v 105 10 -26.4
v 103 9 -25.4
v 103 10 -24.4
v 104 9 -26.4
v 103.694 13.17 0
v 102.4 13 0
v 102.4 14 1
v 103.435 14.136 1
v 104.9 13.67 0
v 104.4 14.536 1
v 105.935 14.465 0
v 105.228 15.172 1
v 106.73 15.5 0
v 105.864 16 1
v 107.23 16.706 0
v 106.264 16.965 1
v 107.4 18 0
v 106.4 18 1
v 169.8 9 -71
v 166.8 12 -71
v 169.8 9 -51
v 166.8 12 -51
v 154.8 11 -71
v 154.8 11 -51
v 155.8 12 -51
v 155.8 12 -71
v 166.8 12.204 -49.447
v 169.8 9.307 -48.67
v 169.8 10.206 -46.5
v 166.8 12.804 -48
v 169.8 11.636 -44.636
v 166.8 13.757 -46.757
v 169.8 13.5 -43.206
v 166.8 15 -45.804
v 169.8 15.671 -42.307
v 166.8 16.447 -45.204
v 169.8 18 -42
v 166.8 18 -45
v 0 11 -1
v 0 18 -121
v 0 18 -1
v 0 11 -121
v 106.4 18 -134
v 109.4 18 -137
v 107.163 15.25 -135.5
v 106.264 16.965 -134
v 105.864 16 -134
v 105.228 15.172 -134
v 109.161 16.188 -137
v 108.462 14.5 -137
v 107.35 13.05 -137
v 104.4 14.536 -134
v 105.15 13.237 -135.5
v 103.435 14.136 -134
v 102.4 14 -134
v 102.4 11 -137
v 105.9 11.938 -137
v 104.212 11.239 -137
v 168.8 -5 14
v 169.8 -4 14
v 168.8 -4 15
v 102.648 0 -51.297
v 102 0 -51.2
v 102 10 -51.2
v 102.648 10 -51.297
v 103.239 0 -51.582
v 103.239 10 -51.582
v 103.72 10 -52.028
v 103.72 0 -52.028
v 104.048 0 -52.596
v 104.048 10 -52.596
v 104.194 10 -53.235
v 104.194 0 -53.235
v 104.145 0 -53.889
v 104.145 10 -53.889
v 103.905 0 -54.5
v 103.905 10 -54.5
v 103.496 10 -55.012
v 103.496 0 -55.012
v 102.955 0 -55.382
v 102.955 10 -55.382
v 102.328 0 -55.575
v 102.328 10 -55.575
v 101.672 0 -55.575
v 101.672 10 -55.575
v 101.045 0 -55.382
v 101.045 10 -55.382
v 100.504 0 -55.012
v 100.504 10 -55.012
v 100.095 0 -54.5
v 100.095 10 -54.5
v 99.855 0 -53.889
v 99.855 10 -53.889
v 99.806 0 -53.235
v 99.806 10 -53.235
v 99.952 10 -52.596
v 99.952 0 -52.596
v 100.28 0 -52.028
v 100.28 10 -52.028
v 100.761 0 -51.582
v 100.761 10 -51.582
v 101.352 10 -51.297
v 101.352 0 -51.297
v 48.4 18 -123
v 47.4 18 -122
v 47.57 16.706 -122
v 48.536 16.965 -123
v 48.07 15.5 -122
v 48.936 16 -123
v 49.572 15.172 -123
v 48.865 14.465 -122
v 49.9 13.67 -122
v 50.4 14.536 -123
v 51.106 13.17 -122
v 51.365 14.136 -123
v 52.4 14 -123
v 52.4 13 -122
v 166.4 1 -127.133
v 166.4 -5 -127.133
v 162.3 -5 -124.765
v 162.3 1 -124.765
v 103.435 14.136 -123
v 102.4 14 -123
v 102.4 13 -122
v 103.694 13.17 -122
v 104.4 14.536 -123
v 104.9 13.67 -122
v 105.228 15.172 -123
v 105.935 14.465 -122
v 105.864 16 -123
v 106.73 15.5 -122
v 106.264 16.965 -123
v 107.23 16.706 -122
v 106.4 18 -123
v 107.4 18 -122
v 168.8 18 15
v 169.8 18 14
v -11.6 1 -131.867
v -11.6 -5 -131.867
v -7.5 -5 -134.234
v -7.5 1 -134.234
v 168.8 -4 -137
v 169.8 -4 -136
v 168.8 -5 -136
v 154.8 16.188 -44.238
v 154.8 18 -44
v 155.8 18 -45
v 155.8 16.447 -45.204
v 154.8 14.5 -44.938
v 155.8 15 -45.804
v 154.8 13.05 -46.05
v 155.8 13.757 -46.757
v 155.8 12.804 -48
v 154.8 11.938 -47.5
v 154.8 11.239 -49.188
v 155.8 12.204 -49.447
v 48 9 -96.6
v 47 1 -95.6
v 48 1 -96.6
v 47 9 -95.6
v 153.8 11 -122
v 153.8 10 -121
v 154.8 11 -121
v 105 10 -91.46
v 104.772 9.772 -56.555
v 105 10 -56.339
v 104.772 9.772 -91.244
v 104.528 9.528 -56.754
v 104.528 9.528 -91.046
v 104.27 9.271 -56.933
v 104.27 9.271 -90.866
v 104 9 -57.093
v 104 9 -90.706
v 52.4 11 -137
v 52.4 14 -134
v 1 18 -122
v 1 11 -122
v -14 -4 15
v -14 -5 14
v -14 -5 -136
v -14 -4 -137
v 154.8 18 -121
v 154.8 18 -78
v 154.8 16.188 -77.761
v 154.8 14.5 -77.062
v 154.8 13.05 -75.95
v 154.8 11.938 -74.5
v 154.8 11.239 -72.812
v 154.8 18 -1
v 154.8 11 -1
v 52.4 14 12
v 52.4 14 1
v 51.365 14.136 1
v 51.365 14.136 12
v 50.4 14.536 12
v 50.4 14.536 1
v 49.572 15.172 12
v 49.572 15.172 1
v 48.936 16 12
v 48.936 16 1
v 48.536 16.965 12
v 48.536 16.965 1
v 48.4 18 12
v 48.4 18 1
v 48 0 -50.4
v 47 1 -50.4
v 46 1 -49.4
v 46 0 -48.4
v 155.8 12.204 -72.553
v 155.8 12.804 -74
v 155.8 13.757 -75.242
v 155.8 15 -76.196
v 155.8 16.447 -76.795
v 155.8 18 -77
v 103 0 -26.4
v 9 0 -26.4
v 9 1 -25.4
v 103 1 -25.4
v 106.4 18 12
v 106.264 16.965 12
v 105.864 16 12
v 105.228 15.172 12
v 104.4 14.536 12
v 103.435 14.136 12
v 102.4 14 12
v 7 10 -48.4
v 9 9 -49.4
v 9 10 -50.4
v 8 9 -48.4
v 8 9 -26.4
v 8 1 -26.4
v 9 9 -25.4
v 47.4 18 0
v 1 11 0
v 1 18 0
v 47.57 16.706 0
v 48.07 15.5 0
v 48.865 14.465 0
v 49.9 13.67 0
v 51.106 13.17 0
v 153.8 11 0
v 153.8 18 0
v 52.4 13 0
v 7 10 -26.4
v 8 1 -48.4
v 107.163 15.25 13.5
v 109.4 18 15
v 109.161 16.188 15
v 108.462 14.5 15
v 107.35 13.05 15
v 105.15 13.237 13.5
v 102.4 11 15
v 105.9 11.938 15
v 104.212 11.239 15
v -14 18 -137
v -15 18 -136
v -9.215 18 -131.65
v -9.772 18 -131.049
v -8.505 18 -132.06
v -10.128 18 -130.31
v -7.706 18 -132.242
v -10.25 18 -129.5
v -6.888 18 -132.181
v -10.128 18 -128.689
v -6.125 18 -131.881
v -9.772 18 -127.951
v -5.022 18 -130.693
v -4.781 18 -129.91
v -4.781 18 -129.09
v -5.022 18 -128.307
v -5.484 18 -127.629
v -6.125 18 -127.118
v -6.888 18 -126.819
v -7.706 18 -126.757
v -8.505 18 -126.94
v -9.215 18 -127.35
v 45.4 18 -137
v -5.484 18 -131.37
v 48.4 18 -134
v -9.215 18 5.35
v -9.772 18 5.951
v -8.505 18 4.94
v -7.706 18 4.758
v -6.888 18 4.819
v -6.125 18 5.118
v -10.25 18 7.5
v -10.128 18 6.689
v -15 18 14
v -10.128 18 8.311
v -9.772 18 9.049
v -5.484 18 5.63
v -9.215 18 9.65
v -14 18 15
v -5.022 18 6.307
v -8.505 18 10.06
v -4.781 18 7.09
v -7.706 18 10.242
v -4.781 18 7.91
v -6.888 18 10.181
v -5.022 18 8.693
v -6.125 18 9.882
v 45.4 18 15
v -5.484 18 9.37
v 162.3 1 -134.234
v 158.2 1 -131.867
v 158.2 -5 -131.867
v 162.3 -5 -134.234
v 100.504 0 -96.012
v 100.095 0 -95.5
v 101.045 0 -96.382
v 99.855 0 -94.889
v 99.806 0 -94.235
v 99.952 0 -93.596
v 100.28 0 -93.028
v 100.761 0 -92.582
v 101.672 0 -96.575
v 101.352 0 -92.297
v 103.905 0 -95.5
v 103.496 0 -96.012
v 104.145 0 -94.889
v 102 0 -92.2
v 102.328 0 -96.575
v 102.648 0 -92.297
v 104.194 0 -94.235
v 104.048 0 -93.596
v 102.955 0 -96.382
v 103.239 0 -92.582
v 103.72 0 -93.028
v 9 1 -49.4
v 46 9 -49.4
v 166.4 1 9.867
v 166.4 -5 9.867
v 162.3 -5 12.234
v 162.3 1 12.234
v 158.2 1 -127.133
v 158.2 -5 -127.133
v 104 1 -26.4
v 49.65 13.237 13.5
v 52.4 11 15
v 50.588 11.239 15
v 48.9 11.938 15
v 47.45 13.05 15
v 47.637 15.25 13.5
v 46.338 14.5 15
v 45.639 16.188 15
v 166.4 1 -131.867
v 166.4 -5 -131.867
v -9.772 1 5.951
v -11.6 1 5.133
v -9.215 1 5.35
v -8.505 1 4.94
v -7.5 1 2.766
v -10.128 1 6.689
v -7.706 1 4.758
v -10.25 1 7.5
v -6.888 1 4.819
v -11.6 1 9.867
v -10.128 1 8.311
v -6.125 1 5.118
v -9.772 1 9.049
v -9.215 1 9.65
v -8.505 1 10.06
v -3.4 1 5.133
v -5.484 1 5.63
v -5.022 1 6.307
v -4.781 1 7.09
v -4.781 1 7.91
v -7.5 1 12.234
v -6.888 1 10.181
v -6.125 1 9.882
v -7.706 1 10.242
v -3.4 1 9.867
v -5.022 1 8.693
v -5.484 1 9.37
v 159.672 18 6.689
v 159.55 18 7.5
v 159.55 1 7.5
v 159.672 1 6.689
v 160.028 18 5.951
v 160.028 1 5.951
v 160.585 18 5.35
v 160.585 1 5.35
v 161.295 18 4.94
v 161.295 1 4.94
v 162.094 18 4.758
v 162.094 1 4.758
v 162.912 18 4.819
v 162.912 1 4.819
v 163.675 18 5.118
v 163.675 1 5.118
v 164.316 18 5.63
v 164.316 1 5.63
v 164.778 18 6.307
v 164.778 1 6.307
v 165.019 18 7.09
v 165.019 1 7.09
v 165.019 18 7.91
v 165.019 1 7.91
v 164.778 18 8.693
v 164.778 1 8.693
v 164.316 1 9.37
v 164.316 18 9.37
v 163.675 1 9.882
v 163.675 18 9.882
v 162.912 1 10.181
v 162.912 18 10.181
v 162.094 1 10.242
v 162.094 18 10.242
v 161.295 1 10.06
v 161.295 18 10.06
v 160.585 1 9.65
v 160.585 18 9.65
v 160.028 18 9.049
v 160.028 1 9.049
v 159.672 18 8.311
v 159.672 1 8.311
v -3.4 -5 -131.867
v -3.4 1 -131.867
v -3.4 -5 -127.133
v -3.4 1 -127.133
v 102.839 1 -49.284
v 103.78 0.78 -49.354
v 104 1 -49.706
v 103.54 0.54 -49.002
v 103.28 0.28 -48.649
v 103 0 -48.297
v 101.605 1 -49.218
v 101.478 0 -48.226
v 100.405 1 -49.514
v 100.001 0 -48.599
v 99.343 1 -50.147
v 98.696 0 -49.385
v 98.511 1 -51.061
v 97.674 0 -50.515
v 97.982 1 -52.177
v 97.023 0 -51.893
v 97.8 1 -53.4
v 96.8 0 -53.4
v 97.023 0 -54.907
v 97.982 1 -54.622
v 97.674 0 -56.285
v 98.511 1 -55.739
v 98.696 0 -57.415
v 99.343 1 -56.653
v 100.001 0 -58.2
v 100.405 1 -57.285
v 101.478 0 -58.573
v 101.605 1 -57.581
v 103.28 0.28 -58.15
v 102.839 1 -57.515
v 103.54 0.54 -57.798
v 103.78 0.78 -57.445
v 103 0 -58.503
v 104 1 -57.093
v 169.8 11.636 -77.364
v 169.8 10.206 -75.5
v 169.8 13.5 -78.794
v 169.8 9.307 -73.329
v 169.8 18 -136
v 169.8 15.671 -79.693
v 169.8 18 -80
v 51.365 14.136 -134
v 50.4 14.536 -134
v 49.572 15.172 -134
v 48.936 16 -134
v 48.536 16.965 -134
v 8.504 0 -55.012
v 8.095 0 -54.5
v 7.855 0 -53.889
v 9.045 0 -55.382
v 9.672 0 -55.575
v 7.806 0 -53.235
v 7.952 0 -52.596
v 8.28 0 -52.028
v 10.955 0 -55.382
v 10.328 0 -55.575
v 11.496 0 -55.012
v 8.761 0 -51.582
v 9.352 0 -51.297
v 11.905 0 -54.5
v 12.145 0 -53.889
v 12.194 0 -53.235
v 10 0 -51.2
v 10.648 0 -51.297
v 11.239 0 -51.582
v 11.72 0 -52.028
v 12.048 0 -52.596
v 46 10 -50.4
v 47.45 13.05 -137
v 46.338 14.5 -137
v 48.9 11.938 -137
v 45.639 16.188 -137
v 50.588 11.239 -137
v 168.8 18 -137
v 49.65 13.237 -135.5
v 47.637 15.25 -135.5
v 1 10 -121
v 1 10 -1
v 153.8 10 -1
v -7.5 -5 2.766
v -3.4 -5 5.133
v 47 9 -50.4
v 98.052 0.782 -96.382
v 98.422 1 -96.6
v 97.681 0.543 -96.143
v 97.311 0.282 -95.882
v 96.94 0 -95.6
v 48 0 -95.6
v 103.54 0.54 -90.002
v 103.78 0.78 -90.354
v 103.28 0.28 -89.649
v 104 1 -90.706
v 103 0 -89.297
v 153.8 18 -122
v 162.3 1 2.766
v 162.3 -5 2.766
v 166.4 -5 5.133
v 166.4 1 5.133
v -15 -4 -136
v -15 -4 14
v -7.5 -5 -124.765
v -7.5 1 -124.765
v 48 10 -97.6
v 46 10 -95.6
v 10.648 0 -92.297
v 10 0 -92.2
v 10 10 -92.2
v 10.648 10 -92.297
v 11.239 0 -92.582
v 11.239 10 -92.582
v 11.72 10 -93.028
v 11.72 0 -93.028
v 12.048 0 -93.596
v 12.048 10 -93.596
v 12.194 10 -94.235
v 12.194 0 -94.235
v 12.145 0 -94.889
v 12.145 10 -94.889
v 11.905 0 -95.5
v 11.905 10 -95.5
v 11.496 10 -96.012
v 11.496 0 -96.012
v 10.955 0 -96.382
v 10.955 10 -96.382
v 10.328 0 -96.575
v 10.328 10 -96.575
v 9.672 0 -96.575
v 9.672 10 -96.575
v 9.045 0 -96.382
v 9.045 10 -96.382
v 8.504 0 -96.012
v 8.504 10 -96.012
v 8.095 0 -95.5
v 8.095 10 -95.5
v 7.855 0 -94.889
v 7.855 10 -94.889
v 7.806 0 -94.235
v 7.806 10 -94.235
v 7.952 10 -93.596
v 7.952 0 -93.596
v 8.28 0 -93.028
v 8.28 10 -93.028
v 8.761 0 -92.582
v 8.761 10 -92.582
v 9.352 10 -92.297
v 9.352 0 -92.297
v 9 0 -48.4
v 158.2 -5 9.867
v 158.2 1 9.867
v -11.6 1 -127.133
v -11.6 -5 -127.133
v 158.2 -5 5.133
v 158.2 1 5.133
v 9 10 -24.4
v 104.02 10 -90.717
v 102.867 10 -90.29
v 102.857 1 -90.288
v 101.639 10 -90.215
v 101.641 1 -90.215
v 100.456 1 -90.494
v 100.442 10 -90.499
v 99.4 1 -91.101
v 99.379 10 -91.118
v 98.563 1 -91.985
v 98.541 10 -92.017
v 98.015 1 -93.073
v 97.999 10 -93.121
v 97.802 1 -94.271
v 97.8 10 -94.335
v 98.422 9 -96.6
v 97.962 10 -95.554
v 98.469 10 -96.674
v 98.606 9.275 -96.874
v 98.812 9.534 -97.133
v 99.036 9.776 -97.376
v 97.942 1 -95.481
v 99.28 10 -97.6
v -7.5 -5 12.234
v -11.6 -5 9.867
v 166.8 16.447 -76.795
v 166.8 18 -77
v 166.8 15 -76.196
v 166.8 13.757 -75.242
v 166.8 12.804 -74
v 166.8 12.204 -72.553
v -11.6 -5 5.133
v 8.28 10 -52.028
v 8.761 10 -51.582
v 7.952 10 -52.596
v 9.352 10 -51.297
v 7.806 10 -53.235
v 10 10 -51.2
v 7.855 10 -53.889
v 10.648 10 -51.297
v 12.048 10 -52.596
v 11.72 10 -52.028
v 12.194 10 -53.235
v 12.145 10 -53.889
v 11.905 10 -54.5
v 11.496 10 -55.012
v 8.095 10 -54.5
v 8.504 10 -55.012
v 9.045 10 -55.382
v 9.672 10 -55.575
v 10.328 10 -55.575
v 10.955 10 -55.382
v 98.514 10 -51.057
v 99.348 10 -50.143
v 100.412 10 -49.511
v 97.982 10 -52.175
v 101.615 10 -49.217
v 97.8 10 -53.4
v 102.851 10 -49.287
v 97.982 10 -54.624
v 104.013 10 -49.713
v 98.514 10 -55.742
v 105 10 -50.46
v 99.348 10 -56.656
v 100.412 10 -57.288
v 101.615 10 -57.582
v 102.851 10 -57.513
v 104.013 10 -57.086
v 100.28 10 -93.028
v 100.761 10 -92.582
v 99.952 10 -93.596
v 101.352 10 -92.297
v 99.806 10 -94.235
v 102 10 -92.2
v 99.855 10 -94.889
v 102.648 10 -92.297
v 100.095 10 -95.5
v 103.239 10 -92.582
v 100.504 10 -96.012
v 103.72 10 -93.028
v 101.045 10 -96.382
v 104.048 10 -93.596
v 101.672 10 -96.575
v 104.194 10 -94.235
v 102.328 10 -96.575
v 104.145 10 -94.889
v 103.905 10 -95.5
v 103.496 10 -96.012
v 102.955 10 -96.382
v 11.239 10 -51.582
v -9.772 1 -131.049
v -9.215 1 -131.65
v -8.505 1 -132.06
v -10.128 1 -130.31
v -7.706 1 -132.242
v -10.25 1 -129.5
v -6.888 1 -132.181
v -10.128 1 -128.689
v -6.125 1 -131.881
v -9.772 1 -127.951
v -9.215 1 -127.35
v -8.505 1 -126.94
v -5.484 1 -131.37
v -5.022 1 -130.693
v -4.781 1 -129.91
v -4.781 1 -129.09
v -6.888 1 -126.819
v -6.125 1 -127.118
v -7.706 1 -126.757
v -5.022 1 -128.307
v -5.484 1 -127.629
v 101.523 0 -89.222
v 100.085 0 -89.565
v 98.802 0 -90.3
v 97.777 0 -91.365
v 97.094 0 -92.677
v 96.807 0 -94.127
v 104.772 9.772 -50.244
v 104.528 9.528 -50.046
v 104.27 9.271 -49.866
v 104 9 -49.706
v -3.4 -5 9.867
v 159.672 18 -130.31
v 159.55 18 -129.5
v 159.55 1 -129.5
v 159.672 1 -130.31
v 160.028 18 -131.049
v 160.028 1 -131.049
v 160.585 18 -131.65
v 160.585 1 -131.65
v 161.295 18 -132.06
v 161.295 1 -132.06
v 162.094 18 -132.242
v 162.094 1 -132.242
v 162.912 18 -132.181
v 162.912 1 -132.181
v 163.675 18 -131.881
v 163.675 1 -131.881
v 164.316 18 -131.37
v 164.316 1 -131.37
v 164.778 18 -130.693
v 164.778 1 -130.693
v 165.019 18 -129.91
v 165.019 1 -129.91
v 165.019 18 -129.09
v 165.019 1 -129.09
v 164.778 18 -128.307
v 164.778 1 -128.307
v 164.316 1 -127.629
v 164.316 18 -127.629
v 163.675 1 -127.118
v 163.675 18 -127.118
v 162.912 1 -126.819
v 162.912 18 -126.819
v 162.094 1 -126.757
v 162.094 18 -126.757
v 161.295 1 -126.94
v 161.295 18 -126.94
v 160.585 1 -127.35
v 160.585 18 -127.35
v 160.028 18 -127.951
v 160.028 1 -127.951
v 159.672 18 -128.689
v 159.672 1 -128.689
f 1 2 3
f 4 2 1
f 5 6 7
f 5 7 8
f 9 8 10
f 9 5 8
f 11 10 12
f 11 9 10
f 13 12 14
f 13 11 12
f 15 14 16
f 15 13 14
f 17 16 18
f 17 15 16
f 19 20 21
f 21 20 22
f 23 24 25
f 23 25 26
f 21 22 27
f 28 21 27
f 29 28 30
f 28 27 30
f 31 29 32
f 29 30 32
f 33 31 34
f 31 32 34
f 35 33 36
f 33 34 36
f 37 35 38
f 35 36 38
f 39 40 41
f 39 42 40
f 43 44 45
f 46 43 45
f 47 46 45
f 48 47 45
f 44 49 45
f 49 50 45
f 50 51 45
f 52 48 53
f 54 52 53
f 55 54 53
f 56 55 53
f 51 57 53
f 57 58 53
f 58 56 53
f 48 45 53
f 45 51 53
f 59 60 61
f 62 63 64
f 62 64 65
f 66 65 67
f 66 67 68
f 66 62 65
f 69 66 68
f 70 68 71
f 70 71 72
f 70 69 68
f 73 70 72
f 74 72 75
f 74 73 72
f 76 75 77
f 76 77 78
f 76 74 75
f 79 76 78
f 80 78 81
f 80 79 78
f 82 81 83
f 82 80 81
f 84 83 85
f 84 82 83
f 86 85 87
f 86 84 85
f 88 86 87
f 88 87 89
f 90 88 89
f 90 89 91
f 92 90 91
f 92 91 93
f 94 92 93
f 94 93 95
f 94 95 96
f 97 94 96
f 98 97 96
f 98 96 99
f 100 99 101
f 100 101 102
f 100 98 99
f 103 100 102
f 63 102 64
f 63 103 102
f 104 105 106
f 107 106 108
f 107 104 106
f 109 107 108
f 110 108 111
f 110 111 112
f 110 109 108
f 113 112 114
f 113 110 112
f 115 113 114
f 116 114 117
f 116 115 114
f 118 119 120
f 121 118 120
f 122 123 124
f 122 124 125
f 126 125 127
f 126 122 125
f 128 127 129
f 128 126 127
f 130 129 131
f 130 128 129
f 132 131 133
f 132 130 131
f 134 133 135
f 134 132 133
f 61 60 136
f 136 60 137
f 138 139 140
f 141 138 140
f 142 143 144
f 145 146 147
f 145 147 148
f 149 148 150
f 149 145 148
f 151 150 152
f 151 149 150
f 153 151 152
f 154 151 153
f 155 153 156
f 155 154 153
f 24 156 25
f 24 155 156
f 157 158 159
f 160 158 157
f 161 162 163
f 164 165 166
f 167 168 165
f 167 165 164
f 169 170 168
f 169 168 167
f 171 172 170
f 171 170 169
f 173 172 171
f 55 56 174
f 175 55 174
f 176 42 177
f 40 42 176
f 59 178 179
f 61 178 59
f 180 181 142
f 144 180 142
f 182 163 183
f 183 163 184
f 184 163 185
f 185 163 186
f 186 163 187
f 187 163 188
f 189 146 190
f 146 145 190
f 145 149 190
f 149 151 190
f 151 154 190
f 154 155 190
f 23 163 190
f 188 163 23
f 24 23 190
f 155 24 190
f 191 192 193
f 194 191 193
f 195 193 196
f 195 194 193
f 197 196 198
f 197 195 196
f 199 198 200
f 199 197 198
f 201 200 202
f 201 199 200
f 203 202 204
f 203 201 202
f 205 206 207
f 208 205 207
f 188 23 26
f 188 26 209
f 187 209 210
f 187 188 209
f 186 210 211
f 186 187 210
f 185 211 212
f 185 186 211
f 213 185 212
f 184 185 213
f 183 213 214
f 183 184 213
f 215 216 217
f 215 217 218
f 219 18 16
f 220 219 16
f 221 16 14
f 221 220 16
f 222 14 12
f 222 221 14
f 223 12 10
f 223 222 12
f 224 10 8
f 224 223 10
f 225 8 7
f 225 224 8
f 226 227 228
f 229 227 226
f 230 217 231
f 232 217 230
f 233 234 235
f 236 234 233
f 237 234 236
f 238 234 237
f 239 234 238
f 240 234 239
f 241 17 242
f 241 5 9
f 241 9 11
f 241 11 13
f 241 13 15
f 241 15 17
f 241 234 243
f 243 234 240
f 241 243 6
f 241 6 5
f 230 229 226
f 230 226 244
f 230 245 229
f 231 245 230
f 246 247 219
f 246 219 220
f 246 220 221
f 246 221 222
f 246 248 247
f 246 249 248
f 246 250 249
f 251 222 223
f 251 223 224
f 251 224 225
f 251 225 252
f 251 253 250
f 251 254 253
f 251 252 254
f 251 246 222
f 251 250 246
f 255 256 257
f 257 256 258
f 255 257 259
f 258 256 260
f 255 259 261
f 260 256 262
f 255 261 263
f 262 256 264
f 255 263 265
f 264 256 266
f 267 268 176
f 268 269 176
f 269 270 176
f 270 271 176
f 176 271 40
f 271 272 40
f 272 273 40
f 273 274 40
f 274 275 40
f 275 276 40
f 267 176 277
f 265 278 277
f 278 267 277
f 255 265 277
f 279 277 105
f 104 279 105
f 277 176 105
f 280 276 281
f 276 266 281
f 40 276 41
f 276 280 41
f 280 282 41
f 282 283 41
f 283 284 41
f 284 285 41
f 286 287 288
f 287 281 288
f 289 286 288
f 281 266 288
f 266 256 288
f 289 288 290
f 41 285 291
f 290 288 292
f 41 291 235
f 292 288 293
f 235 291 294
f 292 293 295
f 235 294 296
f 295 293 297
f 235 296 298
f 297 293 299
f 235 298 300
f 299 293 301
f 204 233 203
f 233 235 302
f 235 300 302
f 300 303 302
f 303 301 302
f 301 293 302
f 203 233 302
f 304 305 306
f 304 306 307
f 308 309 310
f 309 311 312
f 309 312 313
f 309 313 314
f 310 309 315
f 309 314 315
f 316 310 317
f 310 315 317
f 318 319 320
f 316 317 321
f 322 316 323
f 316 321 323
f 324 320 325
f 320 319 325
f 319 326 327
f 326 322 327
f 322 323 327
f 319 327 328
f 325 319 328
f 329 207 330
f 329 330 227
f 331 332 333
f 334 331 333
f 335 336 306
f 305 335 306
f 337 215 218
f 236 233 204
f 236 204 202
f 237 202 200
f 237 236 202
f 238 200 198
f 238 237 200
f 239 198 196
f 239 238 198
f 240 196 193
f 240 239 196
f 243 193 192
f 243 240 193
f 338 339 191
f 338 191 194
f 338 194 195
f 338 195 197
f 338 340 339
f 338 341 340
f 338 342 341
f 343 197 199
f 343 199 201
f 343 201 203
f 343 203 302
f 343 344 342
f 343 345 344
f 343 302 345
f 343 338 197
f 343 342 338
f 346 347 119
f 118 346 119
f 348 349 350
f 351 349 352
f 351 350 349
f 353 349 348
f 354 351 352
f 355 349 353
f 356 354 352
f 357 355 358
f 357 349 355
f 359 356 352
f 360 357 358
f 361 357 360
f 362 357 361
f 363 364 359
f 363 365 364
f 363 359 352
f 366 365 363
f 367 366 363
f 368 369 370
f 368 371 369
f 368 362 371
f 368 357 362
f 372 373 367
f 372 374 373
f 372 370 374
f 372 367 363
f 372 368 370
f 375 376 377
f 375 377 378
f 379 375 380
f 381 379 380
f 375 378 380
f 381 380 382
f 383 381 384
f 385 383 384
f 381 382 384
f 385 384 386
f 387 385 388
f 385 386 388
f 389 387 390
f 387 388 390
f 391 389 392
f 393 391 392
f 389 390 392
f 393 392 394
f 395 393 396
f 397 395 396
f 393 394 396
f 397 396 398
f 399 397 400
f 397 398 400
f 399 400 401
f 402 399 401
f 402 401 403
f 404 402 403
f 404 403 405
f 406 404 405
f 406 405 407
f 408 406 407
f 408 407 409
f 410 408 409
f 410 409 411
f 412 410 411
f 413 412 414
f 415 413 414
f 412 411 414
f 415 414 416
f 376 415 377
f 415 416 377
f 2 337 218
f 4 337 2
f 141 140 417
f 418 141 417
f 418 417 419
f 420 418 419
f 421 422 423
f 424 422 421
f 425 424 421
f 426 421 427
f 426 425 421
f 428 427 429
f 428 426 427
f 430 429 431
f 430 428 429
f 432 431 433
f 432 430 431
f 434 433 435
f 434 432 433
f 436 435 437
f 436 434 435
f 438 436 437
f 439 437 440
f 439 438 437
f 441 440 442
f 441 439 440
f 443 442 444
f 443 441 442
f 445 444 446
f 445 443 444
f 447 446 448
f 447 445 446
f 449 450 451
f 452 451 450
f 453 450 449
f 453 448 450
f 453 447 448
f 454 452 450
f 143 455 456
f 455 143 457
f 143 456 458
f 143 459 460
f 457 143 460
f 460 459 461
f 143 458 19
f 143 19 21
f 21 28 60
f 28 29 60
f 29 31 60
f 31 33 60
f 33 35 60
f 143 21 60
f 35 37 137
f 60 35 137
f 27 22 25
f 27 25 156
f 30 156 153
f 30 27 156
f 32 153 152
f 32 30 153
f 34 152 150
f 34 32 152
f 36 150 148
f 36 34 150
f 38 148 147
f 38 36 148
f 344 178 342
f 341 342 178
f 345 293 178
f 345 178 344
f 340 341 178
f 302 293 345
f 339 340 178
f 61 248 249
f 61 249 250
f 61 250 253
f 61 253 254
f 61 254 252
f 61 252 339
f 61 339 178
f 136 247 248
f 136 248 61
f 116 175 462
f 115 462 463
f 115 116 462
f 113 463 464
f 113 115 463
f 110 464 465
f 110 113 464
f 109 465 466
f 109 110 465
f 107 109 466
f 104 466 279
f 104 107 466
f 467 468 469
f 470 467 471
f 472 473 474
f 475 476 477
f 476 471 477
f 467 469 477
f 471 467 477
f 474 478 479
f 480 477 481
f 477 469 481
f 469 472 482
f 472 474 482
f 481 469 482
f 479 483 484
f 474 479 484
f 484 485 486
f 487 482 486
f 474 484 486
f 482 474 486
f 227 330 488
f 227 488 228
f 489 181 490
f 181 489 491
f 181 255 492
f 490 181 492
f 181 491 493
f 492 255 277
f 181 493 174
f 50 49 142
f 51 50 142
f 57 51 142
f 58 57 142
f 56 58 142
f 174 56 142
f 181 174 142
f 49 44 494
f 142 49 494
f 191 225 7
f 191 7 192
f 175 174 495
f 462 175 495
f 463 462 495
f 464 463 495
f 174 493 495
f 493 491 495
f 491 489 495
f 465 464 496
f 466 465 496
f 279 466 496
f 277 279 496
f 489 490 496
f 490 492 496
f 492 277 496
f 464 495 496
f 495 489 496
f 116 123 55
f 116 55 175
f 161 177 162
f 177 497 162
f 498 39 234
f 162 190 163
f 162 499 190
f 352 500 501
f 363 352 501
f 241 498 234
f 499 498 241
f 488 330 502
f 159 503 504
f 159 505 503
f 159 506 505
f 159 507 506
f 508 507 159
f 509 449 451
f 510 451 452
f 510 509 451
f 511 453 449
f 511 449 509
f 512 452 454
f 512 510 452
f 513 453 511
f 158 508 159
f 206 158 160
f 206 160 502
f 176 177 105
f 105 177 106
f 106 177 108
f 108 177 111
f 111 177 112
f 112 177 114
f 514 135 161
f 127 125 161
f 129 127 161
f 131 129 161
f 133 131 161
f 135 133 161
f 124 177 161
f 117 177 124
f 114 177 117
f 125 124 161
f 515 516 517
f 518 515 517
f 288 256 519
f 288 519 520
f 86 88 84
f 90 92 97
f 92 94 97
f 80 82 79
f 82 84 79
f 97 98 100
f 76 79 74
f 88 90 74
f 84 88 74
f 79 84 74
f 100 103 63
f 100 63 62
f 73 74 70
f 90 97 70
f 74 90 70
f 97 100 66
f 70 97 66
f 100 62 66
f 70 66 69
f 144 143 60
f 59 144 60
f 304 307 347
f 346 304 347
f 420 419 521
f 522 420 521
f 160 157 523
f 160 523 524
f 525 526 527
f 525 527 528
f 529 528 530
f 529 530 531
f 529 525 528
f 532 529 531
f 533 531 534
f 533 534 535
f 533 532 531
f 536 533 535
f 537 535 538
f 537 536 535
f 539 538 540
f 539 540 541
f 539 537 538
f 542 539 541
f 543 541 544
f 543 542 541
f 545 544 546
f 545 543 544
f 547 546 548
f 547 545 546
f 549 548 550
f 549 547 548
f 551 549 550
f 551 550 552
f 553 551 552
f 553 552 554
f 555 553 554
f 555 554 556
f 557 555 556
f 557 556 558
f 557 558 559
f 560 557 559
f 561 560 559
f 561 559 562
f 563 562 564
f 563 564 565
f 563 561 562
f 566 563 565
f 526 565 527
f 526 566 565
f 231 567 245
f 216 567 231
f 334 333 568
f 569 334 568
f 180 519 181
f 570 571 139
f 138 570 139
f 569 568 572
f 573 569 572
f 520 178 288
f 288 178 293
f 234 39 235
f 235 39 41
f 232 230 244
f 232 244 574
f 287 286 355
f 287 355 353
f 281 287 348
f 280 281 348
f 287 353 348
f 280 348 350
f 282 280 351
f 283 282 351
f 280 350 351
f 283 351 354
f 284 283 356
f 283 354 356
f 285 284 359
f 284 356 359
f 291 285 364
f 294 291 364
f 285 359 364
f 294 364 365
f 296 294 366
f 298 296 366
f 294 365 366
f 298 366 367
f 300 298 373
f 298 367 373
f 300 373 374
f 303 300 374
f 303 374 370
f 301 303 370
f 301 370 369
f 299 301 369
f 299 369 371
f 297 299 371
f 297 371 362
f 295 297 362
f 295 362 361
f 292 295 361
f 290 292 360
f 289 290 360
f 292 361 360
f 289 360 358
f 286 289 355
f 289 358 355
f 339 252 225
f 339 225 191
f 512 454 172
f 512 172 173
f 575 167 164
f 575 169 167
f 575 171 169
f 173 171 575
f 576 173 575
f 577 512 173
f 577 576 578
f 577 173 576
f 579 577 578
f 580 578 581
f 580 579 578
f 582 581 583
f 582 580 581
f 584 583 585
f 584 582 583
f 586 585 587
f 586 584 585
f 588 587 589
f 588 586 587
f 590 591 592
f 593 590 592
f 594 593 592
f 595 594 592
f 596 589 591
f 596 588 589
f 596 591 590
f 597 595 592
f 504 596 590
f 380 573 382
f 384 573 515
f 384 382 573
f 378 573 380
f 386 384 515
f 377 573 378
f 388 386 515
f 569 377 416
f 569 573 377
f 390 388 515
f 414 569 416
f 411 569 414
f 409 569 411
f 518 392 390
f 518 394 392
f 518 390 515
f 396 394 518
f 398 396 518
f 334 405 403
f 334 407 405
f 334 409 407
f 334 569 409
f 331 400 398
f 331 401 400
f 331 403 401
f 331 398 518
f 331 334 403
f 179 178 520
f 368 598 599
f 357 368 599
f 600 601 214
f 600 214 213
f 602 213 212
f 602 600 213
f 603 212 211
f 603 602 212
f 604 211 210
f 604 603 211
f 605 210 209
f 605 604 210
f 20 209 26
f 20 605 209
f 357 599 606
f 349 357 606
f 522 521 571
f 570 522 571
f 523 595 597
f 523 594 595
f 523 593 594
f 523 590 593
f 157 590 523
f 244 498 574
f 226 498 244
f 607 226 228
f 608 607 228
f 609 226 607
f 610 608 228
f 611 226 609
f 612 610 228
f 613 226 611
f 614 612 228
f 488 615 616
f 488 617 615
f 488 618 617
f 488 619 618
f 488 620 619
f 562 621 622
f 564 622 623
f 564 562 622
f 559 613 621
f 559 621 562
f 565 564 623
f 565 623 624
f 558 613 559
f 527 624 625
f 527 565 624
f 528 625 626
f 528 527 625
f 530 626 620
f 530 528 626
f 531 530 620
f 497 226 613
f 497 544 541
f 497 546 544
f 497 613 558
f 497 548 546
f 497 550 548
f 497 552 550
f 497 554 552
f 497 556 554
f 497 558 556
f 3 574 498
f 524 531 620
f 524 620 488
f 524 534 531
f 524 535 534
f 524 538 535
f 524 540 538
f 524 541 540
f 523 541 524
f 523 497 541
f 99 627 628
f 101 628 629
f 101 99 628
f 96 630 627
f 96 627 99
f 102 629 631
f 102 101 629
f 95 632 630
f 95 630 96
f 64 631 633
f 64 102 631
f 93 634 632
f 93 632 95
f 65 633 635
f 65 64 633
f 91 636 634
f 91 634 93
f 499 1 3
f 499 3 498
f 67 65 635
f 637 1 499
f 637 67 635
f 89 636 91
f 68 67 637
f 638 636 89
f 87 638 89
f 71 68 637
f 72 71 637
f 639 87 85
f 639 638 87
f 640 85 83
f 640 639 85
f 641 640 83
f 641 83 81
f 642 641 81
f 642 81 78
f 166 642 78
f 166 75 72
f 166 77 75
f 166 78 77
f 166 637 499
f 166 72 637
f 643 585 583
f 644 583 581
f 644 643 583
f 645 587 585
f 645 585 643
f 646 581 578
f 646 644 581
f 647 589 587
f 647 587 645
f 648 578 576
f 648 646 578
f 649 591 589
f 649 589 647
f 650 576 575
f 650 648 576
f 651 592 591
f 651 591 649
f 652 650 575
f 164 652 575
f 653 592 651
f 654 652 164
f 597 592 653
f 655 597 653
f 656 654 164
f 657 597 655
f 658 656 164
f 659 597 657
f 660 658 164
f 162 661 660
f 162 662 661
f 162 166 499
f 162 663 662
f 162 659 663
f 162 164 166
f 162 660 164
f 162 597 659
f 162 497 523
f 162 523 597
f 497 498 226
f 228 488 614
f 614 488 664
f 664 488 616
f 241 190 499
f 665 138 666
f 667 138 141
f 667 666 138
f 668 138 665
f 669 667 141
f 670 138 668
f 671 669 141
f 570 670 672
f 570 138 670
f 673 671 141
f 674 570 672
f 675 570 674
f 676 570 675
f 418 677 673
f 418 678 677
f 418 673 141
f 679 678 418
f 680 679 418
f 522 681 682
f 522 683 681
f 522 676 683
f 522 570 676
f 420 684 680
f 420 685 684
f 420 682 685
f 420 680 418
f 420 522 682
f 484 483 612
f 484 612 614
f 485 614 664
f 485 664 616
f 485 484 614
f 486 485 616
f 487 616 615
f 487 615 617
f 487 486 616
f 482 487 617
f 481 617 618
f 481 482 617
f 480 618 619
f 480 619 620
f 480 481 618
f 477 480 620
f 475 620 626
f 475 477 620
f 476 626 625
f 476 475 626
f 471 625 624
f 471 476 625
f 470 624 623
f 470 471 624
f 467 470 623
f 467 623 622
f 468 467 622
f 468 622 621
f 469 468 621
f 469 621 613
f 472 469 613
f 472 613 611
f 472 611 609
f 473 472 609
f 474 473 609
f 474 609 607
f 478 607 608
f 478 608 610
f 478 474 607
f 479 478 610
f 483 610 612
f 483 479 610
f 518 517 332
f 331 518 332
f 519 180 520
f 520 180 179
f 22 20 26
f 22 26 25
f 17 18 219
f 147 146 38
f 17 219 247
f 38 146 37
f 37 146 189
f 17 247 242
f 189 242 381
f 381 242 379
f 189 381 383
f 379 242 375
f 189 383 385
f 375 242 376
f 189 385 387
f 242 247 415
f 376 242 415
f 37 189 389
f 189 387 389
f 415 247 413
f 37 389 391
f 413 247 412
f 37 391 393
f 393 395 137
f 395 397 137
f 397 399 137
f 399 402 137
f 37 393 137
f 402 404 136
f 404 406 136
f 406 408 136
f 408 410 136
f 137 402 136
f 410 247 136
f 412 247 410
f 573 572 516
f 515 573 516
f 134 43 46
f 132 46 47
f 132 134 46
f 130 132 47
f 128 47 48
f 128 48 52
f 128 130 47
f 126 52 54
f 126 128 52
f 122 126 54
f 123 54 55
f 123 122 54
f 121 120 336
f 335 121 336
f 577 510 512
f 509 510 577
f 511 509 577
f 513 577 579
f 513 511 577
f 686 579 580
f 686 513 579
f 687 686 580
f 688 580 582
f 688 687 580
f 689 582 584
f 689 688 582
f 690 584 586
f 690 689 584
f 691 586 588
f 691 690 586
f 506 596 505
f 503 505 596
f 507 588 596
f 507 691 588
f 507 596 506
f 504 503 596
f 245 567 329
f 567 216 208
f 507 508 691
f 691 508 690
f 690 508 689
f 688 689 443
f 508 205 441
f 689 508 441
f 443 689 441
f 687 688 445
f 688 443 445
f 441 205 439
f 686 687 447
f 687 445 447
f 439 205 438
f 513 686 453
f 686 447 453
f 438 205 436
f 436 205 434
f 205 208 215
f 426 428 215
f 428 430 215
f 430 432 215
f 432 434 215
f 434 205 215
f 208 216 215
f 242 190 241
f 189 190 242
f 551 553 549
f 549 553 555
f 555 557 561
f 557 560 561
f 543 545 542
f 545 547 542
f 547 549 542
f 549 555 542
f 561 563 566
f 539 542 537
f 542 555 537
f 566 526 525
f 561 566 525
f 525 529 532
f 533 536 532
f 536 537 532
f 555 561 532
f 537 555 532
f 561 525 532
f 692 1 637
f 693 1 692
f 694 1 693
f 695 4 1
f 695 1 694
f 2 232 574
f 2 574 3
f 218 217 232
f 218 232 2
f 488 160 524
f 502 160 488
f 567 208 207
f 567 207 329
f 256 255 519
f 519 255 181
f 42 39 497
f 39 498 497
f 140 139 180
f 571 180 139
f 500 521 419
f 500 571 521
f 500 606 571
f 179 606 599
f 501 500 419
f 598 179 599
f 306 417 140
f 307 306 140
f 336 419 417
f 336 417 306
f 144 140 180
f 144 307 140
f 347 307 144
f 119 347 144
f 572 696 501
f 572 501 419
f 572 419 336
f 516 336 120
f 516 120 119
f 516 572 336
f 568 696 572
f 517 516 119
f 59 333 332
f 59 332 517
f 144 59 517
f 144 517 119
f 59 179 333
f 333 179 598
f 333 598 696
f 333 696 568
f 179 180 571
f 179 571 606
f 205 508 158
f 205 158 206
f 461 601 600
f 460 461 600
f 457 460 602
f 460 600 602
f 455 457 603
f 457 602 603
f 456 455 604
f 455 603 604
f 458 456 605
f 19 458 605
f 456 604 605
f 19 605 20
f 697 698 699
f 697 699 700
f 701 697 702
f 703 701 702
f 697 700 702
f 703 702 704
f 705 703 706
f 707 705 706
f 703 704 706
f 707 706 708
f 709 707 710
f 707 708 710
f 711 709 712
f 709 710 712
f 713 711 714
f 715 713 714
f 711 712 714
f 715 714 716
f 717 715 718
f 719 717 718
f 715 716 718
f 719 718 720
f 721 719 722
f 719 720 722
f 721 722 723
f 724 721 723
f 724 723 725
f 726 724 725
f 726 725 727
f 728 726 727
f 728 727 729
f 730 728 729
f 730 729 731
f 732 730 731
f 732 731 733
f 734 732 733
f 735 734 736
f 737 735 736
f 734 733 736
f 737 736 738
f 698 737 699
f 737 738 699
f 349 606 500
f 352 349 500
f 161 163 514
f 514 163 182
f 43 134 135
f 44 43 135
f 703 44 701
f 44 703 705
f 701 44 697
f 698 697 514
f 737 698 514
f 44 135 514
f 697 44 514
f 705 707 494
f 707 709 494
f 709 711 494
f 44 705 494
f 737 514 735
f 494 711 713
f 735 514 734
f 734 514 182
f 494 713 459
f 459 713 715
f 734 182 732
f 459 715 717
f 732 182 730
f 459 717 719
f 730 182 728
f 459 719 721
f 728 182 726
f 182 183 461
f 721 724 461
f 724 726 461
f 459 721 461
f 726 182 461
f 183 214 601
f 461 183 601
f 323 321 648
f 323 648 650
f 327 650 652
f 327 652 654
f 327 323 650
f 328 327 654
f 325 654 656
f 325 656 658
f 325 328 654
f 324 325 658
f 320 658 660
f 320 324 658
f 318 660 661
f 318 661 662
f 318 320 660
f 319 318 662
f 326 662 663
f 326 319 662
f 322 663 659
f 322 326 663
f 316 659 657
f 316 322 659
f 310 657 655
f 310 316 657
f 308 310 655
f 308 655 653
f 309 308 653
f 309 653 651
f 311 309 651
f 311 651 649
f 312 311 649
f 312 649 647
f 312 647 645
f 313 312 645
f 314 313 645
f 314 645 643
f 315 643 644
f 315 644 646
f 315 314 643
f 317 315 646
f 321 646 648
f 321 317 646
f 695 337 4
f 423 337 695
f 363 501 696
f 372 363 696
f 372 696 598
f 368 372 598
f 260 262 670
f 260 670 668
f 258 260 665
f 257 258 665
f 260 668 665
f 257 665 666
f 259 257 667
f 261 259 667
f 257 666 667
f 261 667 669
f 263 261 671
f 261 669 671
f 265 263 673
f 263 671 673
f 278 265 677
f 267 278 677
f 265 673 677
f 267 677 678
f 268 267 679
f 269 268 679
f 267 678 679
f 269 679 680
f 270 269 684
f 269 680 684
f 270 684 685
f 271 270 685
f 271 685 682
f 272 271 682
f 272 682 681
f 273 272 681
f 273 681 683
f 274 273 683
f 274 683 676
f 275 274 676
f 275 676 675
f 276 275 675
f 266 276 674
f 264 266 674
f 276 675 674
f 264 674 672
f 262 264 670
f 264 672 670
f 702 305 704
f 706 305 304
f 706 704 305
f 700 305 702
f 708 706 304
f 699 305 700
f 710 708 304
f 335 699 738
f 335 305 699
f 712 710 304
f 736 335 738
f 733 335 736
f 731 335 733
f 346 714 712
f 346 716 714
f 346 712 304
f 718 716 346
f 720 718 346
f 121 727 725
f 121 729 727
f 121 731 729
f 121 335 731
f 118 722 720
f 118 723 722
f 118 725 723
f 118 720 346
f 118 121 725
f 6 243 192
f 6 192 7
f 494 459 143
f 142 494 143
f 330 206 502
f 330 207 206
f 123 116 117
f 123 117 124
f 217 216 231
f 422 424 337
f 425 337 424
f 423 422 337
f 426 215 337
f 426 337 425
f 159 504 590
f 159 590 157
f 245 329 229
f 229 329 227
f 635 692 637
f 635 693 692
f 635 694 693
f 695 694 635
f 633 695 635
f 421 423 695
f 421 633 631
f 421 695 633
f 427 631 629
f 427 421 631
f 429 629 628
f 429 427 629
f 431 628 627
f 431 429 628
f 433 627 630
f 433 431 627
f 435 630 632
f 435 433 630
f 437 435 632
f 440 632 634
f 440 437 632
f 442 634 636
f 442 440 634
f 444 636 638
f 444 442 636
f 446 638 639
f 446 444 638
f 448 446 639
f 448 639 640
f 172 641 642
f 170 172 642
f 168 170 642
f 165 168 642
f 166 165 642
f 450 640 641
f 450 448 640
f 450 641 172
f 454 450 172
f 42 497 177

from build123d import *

# Parameters (mm, degrees)
SKETCH1_W                = 154.8
SKETCH1_H                = 121.9997
SKETCH1_R                = 2.2
BOSS_EXTRUDE1_DEPTH      = 10
SKETCH2_W                = 184.8
SKETCH2_H                = 151.9997
SKETCH2_W_2              = 154.8
SKETCH2_H_2              = 121.9997
BOSS_EXTRUDE2_DEPTH      = 18
SKETCH2_2_W              = 184.8
SKETCH2_2_H              = 151.9997
SKETCH2_2_W_2            = 154.8
SKETCH2_2_H_2            = 121.9997
BOSS_EXTRUDE3_DEPTH      = 5
CUT_EXTRUDE1_DEPTH       = 229.604349915
CUT_EXTRUDE2_REACH       = 232.747
M5_CLEARANCE_HOLE1_D     = 5.5
M5_CLEARANCE_HOLE1_DEPTH = 23
M5_CLEARANCE_HOLE1_TIP   = 1.652366702
CUT_EXTRUDE3_DEPTH       = 6
CHAMFER1_SIZE            = 1
CHAMFER2_SIZE            = 3


with BuildPart() as part:
    # Sketch1 → Boss-Extrude1 (new body)
    with BuildSketch(Plane(origin=(0, 0, 0), x_dir=(1, 0, 0), z_dir=(0, 1, 0))):
        with Locations((77.4, 60.99985)):
            Rectangle(SKETCH1_W, SKETCH1_H)
        with Locations(Location((10, 53.3997, 0), (0, 0, 270))):
            Circle(SKETCH1_R, mode=Mode.SUBTRACT)
        with Locations(Location((10, 94.3997, 0), (0, 0, 270))):
            Circle(SKETCH1_R, mode=Mode.SUBTRACT)
        with Locations(Location((102, 94.3997, 0), (0, 0, 270))):
            Circle(SKETCH1_R, mode=Mode.SUBTRACT)
        with Locations(Location((102, 53.3997, 0), (0, 0, 270))):
            Circle(SKETCH1_R, mode=Mode.SUBTRACT)
        with BuildLine():
            Line((8, 49.3997), (8, 25.4))
            Line((8, 25.4), (104, 25.4))
            Line((104, 25.4), (104, 49.706462937))
            ThreePointArc((104, 49.706462937), (97.8, 53.3997), (104, 57.092937063))
            Line((104, 57.092937063), (104, 90.706462937))
            ThreePointArc((104, 90.706462937), (98.94961445, 91.512634363), (98.422291236, 96.5997))
            Line((98.422291236, 96.5997), (47, 96.5997))
            Line((47, 96.5997), (47, 49.3997))
            Line((47, 49.3997), (8, 49.3997))
        make_face(mode=Mode.SUBTRACT)
    extrude(amount=BOSS_EXTRUDE1_DEPTH)

    # Sketch2 → Boss-Extrude2 (add)
    with BuildSketch(Plane.XZ):
        with Locations((77.4, -60.99985)):
            Rectangle(SKETCH2_W, SKETCH2_H)
        with Locations((77.4, -60.99985)):
            Rectangle(SKETCH2_W_2, SKETCH2_H_2, mode=Mode.SUBTRACT)
    extrude(amount=-BOSS_EXTRUDE2_DEPTH)

    # Sketch2<2> → Boss-Extrude3 (add)
    # profile 1 of 2: a face of its own
    with BuildSketch(Plane.XZ):
        with Locations((77.4, -60.99985)):
            Rectangle(SKETCH2_2_W, SKETCH2_2_H)
        with Locations((77.4, -60.99985)):
            Rectangle(SKETCH2_2_W_2, SKETCH2_2_H_2, mode=Mode.SUBTRACT)
    # profile 2 of 2: a face of its own
    with BuildSketch(Plane.XZ):
        with Locations((77.4, -60.99985)):
            Rectangle(SKETCH2_2_W_2, SKETCH2_2_H_2)
    extrude(amount=BOSS_EXTRUDE3_DEPTH)

    # Sketch3 → Cut-Extrude1 (cut, through all)
    with BuildSketch(Plane.XY.offset(15)):
        with BuildLine():
            Line((52.4, 22), (102.4, 22))
            ThreePointArc((102.4, 22), (106.4, 18), (102.4, 14))
            Line((102.4, 14), (52.4, 14))
            ThreePointArc((52.4, 14), (48.4, 18), (52.4, 22))
        make_face()
    extrude(amount=-CUT_EXTRUDE1_DEPTH, mode=Mode.SUBTRACT)

    # Sketch4 → Cut-Extrude2 (cut, up to next)
    with BuildSketch(Plane(origin=(169.8, 0, 0), x_dir=(0, 0, -1), z_dir=(1, 0, 0)), mode=Mode.PRIVATE) as cut_extrude2_sk1:
        with BuildLine():
            Line((50.99985, 24), (70.99985, 24))
            ThreePointArc((70.99985, 24), (76.99985, 18), (70.99985, 12))
            Line((70.99985, 12), (50.99985, 12))
            ThreePointArc((50.99985, 12), (44.99985, 18), (50.99985, 24))
        make_face()
    cut_extrude2_tool1 = extrude(cut_extrude2_sk1.sketch, amount=-CUT_EXTRUDE2_REACH, mode=Mode.PRIVATE) & part.part
    add(cut_extrude2_tool1.solids().sort_by_distance((169.8, 18, -60.99985))[0], mode=Mode.SUBTRACT)

    # M5 Clearance Hole1
    with Locations(Plane(origin=(0, 18, 0), x_dir=(1, 0, 0), z_dir=(0, 1, 0))):
        with Locations((162.3, 129.4997), (162.3, -7.5), (-7.5, 129.4997), (-7.5, -7.5)):
            Hole(M5_CLEARANCE_HOLE1_D / 2, depth=M5_CLEARANCE_HOLE1_DEPTH)
            with Locations((0, 0, -(M5_CLEARANCE_HOLE1_DEPTH + M5_CLEARANCE_HOLE1_TIP / 2))):  # 118° drill point
                Cone(0, M5_CLEARANCE_HOLE1_D / 2, M5_CLEARANCE_HOLE1_TIP, mode=Mode.SUBTRACT)

    # Sketch7 → Cut-Extrude3 (cut)
    with BuildSketch(Plane.XZ.offset(5)):
        Polygon((-3.4, 9.867136104), (-7.5, 12.234272207), (-11.6, 9.867136104), (-11.6, 5.132863896), (-7.5, 2.765727793), (-3.4, 5.132863896), align=None)
        Polygon((158.2, 9.867136104), (158.2, 5.132863896), (162.3, 2.765727793), (166.4, 5.132863896), (166.4, 9.867136104), (162.3, 12.234272207), align=None)
        Polygon((158.2, -127.132563896), (158.2, -131.866836104), (162.3, -134.233972207), (166.4, -131.866836104), (166.4, -127.132563896), (162.3, -124.765427793), align=None)
        Polygon((-3.4, -127.132563896), (-7.5, -124.765427793), (-11.6, -127.132563896), (-11.6, -131.866836104), (-7.5, -134.233972207), (-3.4, -131.866836104), align=None)
    extrude(amount=-CUT_EXTRUDE3_DEPTH, mode=Mode.SUBTRACT)

    # Chamfer1
    chamfer1_edges = [part.edges().sort_by_distance(p)[0] for p in [
        (77.4, 14, 0),
        (77.4, 14, -121.9997),
        (49.571572875, 15.171572875, -121.9997),
        (49.571572875, 15.171572875, 0),
        (105.228427125, 15.171572875, 0),
        (105.228427125, 15.171572875, -121.9997),
        (154.8, 10, -60.99985),
        (154.8, 12, -60.99985),
        (154.8, 13.757359313, -46.757209313),
        (154.8, 13.757359313, -75.242490687),
        (77.4, 10, -121.9997),
        (27.5, 0, -49.3997),
        (47, 5, -49.3997),
        (8, 0, -37.39985),
        (8, 5, -49.3997),
        (56, 0, -25.4),
        (8, 5, -25.4),
        (104, 0, -37.553231469),
        (104, 5, -25.4),
        (97.8, 0, -53.3997),
        (104, 0, -73.8997),
        (98.94961445, 0, -91.512634363),
        (72.711145618, 0, -96.5997),
        (47, 0, -72.9997),
        (47, 5, -96.5997),
        (27.5, 10, -49.3997),
        (8, 10, -37.39985),
        (56, 10, -25.4),
        (104, 10, -37.553231469),
        (104, 10, -73.8997),
        (72.711145618, 10, -96.5997),
        (47, 10, -72.9997),
        (0, 10, -60.99985),
        (154.8, 14, 0),
        (0, 14, -121.9997),
        (0, 14, 0),
        (154.8, 14, -121.9997),
        (-15, 6.5, 15),
        (169.8, 6.5, 15),
        (169.8, 6.5, -136.9997),
        (-15, 6.5, -136.9997),
        (169.8, -5, -60.99985),
        (77.4, -5, 15),
        (77.4, 10, 0),
        (-15, -5, -60.99985),
        (77.4, -5, -136.9997),
    ]]
    chamfer(chamfer1_edges, length=CHAMFER1_SIZE - 0.0001)  # a hair under: the kernel refuses the full size

    # Chamfer2
    chamfer2_edges = [part.edges().sort_by_distance(p)[0] for p in [
        (77.4, 14, -136.9997),
        (49.571572875, 15.171572875, -136.9997),
        (105.228427125, 15.171572875, -136.9997),
        (49.571572875, 15.171572875, 15),
        (77.4, 14, 15),
        (105.228427125, 15.171572875, 15),
        (169.8, 13.757359313, -75.242490687),
        (169.8, 13.757359313, -46.757209313),
        (169.8, 12, -60.99985),
    ]]
    chamfer(chamfer2_edges, length=CHAMFER2_SIZE)


solid = part.part
